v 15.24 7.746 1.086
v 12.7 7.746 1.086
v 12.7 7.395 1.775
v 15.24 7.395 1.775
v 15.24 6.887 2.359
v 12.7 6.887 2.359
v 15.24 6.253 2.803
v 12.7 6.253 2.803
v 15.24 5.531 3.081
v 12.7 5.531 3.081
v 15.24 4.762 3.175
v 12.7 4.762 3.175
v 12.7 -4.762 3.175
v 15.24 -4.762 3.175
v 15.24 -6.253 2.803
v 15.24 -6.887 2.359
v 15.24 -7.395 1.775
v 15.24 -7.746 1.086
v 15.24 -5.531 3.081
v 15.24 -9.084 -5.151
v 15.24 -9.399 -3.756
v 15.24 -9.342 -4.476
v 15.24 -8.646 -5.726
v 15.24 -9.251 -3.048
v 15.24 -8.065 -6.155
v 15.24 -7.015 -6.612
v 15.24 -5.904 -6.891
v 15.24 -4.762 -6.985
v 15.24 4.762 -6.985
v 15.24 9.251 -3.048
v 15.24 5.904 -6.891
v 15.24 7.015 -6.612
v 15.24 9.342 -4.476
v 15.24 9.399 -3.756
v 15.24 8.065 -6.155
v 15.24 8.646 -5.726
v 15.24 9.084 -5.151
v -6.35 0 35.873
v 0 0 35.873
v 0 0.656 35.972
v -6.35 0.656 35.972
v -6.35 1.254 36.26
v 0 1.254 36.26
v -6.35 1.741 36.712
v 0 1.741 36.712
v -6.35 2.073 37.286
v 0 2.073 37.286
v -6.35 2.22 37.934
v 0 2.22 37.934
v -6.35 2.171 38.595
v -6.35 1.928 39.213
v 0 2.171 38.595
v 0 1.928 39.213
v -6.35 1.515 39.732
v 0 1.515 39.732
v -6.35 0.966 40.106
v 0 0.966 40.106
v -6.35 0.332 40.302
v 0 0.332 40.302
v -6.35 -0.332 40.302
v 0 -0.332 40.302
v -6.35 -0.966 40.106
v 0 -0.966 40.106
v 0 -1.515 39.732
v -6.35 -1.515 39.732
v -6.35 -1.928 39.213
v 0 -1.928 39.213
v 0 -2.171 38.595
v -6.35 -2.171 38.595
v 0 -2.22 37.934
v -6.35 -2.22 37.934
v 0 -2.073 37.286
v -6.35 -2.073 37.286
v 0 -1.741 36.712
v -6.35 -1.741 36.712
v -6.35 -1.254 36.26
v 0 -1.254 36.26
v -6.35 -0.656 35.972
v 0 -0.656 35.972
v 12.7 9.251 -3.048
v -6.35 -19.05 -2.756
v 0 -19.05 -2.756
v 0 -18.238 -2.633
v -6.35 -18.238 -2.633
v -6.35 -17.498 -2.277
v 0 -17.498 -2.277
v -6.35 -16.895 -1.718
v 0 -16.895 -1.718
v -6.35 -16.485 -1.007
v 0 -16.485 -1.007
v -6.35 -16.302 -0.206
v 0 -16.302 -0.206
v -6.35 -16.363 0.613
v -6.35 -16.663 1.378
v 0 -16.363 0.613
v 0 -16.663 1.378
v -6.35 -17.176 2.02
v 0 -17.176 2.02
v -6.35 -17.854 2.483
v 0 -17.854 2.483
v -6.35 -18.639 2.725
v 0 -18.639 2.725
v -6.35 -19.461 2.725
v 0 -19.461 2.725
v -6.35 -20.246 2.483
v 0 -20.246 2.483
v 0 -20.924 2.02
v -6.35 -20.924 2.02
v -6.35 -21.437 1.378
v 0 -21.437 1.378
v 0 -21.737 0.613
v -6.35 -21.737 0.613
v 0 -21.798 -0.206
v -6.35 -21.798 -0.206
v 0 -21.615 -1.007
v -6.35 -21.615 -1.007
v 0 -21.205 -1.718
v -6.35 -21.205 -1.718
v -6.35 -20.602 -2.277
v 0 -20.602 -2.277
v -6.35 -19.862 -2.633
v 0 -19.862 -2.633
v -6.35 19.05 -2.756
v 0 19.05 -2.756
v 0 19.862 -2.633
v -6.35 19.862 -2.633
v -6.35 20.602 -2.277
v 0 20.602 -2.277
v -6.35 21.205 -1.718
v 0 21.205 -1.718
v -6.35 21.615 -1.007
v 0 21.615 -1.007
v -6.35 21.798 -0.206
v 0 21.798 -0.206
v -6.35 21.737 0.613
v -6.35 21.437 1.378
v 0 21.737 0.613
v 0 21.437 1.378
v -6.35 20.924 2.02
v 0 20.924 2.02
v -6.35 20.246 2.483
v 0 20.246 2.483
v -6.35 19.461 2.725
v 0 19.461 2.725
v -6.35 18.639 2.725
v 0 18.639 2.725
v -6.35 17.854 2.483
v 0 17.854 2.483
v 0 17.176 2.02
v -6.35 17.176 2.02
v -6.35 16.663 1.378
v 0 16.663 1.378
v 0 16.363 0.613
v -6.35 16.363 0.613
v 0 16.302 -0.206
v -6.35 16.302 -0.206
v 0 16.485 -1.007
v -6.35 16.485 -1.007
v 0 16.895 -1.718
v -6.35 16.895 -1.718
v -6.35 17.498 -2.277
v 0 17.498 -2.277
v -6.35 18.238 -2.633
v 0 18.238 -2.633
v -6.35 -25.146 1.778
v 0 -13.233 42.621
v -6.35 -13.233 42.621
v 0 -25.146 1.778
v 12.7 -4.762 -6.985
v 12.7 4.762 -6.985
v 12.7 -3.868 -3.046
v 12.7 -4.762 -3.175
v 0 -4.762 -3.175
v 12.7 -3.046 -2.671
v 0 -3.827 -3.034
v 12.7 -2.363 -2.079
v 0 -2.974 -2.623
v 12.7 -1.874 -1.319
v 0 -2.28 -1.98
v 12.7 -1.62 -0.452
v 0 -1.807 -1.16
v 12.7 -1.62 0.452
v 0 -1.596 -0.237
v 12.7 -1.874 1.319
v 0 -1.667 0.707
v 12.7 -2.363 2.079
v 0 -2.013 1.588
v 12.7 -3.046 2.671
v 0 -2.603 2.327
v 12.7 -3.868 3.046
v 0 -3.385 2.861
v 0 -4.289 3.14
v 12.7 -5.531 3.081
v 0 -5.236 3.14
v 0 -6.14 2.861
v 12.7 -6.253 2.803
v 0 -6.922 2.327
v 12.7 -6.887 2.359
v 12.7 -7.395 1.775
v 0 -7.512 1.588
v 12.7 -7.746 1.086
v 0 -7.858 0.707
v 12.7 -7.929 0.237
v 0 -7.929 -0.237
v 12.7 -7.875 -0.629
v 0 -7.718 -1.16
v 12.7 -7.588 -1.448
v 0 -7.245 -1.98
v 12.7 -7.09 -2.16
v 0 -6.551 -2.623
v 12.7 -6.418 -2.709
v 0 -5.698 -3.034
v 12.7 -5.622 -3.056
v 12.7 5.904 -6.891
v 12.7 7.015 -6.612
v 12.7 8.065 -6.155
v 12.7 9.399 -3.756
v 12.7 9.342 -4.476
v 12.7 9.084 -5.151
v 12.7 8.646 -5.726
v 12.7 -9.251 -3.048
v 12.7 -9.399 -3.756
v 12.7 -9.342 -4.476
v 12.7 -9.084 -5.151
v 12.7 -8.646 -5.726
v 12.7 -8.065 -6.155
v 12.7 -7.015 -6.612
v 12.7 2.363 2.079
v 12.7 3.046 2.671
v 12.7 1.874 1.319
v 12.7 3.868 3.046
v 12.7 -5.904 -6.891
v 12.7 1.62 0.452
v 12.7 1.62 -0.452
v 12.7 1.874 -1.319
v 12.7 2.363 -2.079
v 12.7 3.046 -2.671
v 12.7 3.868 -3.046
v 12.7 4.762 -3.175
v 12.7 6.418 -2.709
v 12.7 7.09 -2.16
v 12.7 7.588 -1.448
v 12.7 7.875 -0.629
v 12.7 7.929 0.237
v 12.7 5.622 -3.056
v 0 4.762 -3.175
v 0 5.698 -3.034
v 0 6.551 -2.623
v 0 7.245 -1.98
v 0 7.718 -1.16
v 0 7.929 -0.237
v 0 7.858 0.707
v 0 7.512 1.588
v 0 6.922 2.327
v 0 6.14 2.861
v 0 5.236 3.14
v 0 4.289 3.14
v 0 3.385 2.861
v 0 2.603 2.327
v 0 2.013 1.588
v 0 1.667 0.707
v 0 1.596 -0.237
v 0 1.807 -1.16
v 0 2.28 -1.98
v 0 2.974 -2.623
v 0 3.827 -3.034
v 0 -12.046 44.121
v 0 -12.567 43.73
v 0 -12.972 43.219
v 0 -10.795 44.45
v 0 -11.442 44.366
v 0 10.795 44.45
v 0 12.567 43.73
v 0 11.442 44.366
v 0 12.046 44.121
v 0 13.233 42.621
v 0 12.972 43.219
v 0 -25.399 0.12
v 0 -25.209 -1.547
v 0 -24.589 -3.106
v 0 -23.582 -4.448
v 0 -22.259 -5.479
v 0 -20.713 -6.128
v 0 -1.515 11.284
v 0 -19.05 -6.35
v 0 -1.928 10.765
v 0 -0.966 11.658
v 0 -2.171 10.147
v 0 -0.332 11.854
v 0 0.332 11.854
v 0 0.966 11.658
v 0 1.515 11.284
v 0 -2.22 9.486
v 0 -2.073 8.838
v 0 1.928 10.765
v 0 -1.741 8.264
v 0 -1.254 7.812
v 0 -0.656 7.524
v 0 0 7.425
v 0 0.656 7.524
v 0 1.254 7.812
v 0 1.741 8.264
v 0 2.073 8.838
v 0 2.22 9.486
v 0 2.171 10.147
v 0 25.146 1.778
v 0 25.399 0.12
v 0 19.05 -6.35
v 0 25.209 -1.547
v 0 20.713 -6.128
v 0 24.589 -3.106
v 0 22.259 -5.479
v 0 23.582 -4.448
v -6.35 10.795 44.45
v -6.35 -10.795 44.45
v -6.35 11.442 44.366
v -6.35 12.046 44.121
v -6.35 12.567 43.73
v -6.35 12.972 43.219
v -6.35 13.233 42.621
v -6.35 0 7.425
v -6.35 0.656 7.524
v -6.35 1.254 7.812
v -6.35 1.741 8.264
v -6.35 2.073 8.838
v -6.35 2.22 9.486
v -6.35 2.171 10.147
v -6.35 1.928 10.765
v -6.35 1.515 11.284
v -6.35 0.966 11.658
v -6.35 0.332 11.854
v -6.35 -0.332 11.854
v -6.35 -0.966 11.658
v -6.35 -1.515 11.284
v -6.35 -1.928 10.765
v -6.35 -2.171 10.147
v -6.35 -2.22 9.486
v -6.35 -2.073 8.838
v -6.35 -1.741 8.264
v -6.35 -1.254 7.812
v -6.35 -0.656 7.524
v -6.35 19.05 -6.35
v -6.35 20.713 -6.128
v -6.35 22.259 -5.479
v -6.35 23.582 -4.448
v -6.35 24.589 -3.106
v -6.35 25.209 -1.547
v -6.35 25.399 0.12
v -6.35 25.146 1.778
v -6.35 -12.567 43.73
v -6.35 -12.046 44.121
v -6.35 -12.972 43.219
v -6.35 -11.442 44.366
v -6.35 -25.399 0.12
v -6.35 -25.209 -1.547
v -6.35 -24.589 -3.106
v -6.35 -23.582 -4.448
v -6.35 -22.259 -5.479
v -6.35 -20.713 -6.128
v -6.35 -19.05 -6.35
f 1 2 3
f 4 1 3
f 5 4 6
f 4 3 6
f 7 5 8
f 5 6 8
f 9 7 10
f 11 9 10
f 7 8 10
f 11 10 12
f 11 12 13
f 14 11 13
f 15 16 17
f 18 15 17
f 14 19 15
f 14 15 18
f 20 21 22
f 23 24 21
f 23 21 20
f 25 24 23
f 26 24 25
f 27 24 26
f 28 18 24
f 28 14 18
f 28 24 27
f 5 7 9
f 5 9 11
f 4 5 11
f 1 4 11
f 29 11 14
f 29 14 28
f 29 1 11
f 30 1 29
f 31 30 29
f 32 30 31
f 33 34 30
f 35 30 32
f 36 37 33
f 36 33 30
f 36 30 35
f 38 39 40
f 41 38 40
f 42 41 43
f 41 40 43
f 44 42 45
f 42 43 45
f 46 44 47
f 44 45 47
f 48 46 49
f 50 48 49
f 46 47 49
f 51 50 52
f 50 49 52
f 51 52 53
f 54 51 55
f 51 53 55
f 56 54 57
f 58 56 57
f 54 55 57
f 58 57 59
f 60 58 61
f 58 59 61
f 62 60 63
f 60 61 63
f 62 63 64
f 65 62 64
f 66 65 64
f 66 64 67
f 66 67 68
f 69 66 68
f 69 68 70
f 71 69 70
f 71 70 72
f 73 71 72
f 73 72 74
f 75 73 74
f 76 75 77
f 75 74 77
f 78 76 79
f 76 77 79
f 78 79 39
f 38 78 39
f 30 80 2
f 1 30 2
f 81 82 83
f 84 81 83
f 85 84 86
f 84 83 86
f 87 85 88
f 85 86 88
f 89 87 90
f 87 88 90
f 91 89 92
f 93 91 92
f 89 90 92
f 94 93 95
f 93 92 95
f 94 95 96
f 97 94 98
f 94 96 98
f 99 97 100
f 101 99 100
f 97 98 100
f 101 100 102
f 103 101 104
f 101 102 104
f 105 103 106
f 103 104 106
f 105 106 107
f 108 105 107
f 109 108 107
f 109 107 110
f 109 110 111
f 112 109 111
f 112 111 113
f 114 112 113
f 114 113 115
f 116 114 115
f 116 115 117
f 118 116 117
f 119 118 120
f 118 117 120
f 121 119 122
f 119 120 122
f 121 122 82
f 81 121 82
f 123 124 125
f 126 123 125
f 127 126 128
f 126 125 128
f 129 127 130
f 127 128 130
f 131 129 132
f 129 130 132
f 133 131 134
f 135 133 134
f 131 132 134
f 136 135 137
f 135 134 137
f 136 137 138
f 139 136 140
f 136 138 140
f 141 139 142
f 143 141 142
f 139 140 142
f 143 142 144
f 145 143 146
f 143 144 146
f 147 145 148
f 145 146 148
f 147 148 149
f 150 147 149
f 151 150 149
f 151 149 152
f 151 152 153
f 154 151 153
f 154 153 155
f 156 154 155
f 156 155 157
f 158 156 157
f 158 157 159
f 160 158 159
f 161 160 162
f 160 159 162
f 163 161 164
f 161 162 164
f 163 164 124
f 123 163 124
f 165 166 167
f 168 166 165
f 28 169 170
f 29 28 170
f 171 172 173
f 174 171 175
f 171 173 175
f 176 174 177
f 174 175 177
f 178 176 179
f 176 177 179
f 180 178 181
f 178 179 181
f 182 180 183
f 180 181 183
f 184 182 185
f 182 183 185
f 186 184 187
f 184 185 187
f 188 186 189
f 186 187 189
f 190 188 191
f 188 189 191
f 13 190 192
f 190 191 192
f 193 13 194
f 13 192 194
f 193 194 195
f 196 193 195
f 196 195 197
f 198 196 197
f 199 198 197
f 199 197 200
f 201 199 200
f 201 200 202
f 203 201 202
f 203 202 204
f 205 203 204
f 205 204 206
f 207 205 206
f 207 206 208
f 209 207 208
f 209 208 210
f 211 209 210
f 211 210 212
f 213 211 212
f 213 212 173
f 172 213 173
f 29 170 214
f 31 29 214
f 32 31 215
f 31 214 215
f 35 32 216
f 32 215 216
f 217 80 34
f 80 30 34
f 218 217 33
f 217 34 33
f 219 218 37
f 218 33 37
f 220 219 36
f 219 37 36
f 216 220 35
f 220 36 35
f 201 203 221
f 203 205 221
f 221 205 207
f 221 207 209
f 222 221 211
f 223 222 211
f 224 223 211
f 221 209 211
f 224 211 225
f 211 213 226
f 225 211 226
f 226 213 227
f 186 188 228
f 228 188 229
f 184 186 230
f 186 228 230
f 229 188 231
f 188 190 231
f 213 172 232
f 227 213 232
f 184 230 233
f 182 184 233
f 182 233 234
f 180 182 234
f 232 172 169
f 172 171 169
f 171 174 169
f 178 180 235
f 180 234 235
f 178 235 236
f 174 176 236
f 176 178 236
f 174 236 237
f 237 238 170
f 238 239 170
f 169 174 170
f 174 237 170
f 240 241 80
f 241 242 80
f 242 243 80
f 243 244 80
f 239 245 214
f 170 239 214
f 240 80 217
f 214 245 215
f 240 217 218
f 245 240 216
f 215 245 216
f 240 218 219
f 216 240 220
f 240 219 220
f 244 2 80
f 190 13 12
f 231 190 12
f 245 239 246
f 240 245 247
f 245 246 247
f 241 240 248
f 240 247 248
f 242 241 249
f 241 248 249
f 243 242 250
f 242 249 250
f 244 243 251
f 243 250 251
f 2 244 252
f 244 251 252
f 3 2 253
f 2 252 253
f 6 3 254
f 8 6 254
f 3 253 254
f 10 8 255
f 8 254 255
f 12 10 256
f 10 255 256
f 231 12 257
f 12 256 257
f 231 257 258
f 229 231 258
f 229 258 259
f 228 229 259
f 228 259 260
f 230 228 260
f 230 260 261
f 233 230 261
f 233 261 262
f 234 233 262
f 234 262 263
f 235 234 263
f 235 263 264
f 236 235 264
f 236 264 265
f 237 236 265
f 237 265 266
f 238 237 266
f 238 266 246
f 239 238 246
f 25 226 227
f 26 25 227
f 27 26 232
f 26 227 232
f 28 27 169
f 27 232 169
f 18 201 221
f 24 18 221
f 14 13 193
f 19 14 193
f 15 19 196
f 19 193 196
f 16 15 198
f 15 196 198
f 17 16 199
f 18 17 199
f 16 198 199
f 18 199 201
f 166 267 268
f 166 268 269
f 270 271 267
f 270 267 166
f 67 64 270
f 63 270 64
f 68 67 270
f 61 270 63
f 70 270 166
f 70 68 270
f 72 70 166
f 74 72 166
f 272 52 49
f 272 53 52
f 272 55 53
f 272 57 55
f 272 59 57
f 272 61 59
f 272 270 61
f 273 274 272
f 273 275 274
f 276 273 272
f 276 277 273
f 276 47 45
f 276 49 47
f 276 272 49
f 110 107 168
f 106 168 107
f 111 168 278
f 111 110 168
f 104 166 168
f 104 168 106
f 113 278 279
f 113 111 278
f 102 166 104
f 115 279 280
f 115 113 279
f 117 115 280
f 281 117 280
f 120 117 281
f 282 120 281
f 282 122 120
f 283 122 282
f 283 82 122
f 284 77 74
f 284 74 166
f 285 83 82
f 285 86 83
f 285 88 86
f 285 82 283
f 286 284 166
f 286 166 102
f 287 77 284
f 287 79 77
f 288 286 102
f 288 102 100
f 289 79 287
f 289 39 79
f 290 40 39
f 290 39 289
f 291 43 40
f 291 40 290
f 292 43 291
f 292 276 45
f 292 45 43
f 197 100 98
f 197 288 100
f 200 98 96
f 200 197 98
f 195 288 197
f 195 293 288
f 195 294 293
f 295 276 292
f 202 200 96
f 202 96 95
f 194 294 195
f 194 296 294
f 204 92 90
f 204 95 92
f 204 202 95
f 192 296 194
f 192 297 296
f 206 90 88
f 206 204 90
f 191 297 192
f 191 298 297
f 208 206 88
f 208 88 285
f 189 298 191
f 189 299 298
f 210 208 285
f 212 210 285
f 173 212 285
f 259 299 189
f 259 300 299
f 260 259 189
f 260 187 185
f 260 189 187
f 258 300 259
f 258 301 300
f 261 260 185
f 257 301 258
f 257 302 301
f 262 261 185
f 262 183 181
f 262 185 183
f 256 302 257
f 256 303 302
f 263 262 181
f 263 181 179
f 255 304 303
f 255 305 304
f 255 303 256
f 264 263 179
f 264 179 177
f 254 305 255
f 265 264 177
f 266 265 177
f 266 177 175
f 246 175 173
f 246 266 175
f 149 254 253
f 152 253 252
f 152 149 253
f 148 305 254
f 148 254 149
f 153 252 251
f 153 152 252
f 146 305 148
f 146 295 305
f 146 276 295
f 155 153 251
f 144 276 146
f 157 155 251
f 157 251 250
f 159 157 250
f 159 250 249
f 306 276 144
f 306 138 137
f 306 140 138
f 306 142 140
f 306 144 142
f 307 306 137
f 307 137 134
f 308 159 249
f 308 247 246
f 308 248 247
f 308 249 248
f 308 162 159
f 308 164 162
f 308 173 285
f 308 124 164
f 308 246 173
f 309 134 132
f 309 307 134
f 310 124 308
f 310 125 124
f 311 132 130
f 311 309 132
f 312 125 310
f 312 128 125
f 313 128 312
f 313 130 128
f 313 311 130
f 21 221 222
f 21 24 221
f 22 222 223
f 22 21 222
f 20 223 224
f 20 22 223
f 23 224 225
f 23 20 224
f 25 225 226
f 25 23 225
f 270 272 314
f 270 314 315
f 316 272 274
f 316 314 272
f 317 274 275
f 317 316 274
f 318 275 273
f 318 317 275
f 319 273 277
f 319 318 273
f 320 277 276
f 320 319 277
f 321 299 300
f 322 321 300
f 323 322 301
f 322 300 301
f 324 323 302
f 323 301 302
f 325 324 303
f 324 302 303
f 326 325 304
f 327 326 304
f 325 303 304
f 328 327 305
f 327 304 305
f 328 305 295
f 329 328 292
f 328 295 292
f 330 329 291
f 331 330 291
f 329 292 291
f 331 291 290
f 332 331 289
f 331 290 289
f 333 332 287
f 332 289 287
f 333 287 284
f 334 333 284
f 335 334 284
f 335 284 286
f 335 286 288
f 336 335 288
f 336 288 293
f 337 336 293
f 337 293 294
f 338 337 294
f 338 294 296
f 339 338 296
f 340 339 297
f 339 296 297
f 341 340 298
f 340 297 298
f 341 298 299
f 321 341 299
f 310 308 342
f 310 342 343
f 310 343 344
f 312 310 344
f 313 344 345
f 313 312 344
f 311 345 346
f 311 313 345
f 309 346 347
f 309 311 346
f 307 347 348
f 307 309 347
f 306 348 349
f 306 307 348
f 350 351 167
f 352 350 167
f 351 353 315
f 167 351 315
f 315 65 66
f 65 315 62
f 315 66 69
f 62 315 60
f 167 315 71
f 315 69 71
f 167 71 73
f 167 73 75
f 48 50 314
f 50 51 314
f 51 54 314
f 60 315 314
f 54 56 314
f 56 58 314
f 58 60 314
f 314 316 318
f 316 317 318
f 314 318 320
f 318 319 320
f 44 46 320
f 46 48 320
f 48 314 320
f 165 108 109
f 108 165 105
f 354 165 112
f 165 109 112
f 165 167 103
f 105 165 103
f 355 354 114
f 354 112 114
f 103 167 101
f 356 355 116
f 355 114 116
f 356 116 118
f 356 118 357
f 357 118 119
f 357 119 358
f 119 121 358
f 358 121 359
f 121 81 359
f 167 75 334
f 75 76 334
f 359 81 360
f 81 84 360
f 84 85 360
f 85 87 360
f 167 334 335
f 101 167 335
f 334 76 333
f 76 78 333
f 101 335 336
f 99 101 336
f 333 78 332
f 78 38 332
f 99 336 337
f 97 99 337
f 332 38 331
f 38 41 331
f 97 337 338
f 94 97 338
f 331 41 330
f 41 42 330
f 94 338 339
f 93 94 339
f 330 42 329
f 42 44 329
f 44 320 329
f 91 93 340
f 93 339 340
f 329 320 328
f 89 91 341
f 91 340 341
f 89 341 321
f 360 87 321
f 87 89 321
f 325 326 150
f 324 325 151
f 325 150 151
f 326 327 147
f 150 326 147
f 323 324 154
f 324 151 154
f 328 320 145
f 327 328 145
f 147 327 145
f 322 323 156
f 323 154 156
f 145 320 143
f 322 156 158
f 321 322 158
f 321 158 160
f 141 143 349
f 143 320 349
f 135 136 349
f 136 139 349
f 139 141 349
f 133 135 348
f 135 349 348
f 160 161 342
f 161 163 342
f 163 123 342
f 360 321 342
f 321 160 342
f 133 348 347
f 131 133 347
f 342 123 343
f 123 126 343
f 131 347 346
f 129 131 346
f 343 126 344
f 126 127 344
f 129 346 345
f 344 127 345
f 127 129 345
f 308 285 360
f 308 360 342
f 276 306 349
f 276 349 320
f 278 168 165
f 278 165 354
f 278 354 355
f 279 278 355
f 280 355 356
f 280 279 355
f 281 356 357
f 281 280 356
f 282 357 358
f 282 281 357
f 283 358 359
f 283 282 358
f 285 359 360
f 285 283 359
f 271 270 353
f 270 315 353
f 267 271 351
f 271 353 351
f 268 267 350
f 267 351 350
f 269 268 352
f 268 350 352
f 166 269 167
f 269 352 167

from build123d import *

# Parameters (mm, degrees)
SKETCH1_R           = 2.22670754
SKETCH1_R_2         = 2.7559
BOSS_EXTRUDE1_DEPTH = 6.35
SKETCH2_R           = 3.175
BOSS_EXTRUDE2_DEPTH = 12.7
BOSS_EXTRUDE3_DEPTH = 2.54
FILLET1_R           = 2.54


with BuildPart() as part:
    # Sketch1 → Boss-Extrude1 (new body)
    with BuildSketch(Plane(origin=(0, 0, 0), x_dir=(0, 0, -1), z_dir=(1, 0, 0))):
        with BuildLine():
            Line((-44.45, 12.7), (-44.45, -12.7))
            Line((-44.45, -12.7), (-1.778, -25.146))
            ThreePointArc((-1.778, -25.146), (3.81, -24.13), (6.35, -19.05))
            Line((6.35, -19.05), (6.35, 19.05))
            ThreePointArc((6.35, 19.05), (3.81, 24.13), (-1.778, 25.146))
            Line((-1.778, 25.146), (-44.45, 12.7))
        make_face()
        with Locations((-38.1, 0)):
            Circle(SKETCH1_R, mode=Mode.SUBTRACT)
        with Locations((-9.652, 0)):
            Circle(SKETCH1_R, mode=Mode.SUBTRACT)
        with Locations((0, -19.05)):
            Circle(SKETCH1_R_2, mode=Mode.SUBTRACT)
        with Locations((0, 19.05)):
            Circle(SKETCH1_R_2, mode=Mode.SUBTRACT)
    extrude(amount=-BOSS_EXTRUDE1_DEPTH)

    # Sketch2 → Boss-Extrude2 (add)
    with BuildSketch(Plane(origin=(0, 0, 0), x_dir=(0, 0, -1), z_dir=(1, 0, 0))):
        with Locations((0, -4.7625)):
            Circle(SKETCH2_R)
        with Locations((0, 4.7625)):
            Circle(SKETCH2_R)
    extrude(amount=BOSS_EXTRUDE2_DEPTH)

    # Sketch4 → Boss-Extrude3 (add)
    with BuildSketch(Plane(origin=(12.7, 0, 0), x_dir=(0, 0, -1), z_dir=(1, 0, 0))):
        with BuildLine():
            Line((-3.175, 4.7625), (-3.175, -4.7625))
            ThreePointArc((-3.175, -4.7625), (-2.600807741, -6.583605185), (-1.085913955, -7.746024071))
            Line((-1.085913955, -7.746024071), (4.760575332, -9.873972147))
            ThreePointArc((4.760575332, -9.873972147), (6.404796784, -7.549757281), (6.985, -4.7625))
            Line((6.985, -4.7625), (6.985, 4.7625))
            ThreePointArc((6.985, 4.7625), (6.404796784, 7.549757281), (4.760575332, 9.873972147))
            Line((4.760575332, 9.873972147), (-1.085913955, 7.746024071))
            ThreePointArc((-1.085913955, 7.746024071), (-2.600807741, 6.583605185), (-3.175, 4.7625))
        make_face()
    extrude(amount=BOSS_EXTRUDE3_DEPTH)

    # Fillet1
    fillet1_edges = [part.edges().sort_by_distance(p)[0] for p in [
        (-3.175, -12.7, 44.45),
        (-3.175, 12.7, 44.45),
        (13.97, -9.873972147, -4.760575332),
        (13.97, 9.873972147, -4.760575332),
    ]]
    fillet(fillet1_edges, radius=FILLET1_R)


solid = part.part
